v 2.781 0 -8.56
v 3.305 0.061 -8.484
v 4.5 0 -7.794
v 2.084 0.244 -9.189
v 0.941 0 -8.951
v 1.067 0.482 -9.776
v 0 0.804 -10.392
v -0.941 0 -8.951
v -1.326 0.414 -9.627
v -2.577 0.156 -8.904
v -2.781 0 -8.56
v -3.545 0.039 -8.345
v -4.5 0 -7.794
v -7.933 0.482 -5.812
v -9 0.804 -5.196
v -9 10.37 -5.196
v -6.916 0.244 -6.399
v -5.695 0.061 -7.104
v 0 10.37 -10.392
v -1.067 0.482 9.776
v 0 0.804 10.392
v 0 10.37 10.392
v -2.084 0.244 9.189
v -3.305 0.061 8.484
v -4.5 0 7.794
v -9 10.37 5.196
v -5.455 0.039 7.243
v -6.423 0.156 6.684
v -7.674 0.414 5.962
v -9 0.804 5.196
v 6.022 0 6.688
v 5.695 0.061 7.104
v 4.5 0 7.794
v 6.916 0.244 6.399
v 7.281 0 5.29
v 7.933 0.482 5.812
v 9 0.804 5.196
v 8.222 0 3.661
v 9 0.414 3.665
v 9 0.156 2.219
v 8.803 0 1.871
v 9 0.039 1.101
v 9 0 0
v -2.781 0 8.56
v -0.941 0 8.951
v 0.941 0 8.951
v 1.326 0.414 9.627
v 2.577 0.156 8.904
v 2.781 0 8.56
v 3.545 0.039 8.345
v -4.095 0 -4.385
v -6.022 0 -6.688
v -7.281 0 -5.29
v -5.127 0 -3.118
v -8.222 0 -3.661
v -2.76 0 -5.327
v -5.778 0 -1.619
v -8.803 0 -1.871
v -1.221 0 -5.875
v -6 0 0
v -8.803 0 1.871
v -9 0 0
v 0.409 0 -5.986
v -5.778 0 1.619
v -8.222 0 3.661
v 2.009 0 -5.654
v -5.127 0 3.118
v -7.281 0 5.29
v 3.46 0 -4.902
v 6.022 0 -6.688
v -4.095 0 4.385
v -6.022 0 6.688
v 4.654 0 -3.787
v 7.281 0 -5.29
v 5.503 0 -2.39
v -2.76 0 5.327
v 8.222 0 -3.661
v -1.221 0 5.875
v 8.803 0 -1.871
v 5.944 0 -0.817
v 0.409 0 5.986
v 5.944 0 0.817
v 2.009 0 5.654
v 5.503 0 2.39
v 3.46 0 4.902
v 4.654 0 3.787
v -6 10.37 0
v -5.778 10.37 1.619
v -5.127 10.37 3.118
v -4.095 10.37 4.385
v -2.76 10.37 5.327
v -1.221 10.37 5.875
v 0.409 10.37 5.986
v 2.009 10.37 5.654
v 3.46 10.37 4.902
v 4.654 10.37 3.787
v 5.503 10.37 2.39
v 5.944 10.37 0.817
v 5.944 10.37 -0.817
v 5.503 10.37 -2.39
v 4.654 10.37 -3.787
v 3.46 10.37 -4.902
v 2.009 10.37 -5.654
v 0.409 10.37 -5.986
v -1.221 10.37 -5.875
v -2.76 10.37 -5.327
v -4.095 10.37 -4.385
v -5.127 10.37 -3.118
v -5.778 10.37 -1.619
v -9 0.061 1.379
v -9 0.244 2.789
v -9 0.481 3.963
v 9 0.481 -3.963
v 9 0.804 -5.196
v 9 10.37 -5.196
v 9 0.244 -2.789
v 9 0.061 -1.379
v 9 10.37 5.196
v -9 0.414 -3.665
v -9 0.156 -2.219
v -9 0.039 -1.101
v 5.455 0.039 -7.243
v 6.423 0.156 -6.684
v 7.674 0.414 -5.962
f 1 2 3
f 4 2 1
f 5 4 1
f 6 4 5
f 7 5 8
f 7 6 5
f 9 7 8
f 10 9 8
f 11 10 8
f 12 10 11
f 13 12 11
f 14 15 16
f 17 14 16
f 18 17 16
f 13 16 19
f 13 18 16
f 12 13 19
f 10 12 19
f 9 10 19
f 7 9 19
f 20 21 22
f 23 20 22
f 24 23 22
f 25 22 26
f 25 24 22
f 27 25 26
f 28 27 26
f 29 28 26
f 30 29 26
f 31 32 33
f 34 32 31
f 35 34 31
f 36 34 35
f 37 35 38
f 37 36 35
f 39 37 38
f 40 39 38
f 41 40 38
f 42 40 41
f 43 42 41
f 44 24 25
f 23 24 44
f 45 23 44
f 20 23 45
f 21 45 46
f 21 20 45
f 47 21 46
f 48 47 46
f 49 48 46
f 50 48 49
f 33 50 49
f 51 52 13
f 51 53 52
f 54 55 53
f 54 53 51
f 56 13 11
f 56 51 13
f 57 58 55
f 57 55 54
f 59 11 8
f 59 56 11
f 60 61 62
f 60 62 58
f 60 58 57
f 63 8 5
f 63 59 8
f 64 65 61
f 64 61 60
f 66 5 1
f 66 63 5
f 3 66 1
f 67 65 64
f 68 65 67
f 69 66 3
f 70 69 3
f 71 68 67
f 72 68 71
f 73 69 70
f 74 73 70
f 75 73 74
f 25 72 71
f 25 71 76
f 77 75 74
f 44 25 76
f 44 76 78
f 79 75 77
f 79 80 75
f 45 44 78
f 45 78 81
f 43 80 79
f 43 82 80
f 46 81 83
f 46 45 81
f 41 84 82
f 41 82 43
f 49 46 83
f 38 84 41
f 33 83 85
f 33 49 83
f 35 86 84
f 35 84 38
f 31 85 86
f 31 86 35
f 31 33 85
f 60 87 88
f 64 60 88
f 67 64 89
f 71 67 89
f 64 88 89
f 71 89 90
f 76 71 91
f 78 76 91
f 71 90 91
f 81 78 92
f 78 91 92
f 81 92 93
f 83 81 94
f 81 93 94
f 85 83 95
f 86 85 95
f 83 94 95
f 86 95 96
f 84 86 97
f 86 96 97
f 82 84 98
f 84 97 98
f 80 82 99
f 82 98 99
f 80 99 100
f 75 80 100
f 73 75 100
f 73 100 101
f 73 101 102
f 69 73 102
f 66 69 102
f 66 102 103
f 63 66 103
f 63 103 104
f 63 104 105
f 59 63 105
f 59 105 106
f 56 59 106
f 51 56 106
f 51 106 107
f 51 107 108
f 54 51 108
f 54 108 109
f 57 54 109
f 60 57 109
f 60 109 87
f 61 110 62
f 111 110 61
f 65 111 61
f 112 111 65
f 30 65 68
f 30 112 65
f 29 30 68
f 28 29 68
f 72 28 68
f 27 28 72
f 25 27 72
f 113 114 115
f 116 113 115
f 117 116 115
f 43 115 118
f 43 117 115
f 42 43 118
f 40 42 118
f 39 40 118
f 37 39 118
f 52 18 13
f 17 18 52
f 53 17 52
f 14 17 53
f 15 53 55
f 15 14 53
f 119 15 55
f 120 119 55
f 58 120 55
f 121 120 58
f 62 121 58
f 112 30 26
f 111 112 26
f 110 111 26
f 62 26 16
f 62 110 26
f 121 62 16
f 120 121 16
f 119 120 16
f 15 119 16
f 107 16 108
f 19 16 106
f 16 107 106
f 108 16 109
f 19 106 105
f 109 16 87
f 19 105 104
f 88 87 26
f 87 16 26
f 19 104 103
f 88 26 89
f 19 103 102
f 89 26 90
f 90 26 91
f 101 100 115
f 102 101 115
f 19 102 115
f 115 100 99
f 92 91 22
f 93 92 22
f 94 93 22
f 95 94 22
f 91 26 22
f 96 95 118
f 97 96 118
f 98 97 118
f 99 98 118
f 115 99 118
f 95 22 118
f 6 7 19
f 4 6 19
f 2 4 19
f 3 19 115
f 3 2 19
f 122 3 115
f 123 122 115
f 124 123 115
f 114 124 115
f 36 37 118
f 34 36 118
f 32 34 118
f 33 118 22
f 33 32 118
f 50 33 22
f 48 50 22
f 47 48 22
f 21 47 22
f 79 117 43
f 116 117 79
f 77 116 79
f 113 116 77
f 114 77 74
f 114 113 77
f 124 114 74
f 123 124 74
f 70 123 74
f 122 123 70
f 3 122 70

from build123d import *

# Parameters (mm, degrees)
F1_DEPTH = 10.37
F5_D     = 12


with BuildPart() as f1:
    # F0 (on Front) → F1 (new body)
    with BuildSketch(Plane.XZ):
        Polygon((9, -5.196152), (9, 5.196152), (0, 10.392305), (-9, 5.196152), (-9, -5.196152), (0, -10.392305), align=None)
    extrude(amount=-F1_DEPTH)

    # F2 (on Right) → F3 (revolve, cut)
    with BuildSketch(Plane.YZ):
        Polygon((0, 14.392305), (0, 9), (3.113249, 14.392305), align=None)
    revolve(axis=Axis((0, 2.79976, 0), (0, 1, 0)), mode=Mode.SUBTRACT)

    # F5 (through all)
    with Locations(Plane.XZ):
        with Locations((0, 0)):
            Hole(F5_D / 2)


solid = f1.part
